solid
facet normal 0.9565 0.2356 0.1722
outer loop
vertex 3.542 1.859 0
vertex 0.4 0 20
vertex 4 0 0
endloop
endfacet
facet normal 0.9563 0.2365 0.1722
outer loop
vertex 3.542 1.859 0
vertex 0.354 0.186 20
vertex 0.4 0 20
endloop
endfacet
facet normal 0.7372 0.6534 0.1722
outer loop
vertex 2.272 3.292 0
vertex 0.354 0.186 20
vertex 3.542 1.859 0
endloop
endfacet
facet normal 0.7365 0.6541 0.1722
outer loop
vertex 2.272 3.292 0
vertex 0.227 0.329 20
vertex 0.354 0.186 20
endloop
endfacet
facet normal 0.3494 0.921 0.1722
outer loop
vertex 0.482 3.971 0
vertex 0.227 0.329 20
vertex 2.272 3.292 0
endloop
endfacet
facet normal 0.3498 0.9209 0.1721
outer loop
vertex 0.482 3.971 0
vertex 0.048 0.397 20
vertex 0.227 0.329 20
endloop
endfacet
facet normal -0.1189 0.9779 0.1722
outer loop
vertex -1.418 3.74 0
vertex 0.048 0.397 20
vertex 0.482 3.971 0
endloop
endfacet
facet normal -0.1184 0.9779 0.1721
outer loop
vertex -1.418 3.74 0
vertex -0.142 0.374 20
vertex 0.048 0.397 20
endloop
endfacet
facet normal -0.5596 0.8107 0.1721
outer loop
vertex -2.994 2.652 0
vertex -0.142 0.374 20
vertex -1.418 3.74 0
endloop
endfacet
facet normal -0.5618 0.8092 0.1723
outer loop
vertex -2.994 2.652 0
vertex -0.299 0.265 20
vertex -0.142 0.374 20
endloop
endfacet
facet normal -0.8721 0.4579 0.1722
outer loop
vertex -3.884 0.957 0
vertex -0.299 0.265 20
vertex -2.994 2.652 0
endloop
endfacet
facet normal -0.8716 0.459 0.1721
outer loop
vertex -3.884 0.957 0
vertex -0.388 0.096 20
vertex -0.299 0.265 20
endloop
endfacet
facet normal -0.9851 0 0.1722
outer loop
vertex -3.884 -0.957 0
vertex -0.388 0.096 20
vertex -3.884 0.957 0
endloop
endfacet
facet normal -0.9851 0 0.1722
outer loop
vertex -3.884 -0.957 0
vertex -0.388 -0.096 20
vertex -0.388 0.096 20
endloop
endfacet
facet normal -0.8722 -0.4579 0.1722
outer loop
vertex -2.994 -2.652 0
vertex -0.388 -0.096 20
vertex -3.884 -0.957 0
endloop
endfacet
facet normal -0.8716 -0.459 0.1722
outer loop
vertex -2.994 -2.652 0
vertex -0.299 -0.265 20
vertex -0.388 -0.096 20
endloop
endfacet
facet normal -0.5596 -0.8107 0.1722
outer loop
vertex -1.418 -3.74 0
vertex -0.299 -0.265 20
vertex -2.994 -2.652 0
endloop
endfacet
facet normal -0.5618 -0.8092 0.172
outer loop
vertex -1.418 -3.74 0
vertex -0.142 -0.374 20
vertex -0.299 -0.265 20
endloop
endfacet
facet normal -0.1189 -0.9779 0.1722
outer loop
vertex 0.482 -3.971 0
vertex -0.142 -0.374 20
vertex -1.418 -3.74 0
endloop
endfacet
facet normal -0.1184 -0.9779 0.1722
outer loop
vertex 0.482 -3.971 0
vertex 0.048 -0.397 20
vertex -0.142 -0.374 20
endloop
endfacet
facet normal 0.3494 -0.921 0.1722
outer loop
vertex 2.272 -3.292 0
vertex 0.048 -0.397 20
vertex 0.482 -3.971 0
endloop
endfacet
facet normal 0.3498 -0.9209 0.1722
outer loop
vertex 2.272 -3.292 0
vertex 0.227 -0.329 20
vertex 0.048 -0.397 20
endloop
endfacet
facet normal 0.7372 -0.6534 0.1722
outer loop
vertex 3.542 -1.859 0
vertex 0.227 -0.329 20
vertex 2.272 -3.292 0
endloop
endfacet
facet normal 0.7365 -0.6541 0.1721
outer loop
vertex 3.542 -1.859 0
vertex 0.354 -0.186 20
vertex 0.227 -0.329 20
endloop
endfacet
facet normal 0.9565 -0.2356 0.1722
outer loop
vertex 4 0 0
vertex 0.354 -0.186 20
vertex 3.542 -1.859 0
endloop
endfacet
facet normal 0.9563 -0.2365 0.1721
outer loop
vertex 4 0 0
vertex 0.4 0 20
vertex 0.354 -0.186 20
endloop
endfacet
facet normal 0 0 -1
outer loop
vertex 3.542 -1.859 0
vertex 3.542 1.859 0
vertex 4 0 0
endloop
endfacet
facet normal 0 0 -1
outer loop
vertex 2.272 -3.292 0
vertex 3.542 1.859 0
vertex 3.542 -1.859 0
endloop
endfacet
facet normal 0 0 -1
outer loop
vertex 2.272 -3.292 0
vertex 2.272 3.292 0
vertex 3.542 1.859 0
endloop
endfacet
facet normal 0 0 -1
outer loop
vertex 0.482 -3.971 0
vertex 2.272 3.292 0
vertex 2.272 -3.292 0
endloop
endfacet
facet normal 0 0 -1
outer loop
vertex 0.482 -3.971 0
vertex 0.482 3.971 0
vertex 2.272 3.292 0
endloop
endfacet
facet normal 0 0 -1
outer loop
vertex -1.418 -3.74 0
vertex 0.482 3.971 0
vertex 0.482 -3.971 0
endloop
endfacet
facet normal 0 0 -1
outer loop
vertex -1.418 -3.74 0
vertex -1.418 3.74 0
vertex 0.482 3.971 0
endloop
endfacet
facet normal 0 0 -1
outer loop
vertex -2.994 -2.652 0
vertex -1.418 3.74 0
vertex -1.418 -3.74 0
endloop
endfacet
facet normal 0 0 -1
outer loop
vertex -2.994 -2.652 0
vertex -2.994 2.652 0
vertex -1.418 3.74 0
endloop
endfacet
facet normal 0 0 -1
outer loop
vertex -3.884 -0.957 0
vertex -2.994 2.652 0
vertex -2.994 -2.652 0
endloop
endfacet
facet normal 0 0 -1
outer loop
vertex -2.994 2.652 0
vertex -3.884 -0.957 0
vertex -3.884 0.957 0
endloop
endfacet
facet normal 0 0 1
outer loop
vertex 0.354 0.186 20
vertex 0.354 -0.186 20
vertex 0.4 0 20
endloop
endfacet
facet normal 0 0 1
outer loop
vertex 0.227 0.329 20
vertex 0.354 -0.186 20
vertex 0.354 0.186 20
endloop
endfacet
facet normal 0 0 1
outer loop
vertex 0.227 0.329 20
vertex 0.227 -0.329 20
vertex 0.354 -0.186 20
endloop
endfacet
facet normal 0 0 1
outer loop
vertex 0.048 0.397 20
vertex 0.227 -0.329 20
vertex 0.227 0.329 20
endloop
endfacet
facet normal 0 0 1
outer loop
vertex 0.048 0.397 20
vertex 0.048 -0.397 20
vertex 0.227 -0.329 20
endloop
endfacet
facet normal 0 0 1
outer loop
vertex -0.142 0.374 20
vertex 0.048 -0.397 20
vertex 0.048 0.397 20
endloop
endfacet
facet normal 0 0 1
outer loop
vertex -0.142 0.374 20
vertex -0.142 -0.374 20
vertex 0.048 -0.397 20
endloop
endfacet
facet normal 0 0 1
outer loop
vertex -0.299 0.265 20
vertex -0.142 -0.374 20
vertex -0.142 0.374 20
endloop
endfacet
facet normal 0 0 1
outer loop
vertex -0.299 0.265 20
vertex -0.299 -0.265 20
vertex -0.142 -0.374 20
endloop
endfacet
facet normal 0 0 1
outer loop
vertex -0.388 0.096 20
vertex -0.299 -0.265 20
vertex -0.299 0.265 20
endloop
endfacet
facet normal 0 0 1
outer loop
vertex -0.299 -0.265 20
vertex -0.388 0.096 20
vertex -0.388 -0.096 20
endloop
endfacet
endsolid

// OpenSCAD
// studs/long_spike.scad — the dramatic one.
// MIT licensed.
//
// Tall cone spike. ~2.5x size by default. Set tip_radius = 0 for the full
// "do not approach me at the show" aesthetic, ~0.4 for "I'd like to keep my
// eye."

module stud_long_spike(size = 6, tip_radius = 0.4, height = undef) {
    h = is_undef(height) ? size * 2.5 : height;
    cylinder(h = h, r1 = size / 2, r2 = max(tip_radius, 0.001));
}

stud_long_spike(size = 8, tip_radius = 0.4);
